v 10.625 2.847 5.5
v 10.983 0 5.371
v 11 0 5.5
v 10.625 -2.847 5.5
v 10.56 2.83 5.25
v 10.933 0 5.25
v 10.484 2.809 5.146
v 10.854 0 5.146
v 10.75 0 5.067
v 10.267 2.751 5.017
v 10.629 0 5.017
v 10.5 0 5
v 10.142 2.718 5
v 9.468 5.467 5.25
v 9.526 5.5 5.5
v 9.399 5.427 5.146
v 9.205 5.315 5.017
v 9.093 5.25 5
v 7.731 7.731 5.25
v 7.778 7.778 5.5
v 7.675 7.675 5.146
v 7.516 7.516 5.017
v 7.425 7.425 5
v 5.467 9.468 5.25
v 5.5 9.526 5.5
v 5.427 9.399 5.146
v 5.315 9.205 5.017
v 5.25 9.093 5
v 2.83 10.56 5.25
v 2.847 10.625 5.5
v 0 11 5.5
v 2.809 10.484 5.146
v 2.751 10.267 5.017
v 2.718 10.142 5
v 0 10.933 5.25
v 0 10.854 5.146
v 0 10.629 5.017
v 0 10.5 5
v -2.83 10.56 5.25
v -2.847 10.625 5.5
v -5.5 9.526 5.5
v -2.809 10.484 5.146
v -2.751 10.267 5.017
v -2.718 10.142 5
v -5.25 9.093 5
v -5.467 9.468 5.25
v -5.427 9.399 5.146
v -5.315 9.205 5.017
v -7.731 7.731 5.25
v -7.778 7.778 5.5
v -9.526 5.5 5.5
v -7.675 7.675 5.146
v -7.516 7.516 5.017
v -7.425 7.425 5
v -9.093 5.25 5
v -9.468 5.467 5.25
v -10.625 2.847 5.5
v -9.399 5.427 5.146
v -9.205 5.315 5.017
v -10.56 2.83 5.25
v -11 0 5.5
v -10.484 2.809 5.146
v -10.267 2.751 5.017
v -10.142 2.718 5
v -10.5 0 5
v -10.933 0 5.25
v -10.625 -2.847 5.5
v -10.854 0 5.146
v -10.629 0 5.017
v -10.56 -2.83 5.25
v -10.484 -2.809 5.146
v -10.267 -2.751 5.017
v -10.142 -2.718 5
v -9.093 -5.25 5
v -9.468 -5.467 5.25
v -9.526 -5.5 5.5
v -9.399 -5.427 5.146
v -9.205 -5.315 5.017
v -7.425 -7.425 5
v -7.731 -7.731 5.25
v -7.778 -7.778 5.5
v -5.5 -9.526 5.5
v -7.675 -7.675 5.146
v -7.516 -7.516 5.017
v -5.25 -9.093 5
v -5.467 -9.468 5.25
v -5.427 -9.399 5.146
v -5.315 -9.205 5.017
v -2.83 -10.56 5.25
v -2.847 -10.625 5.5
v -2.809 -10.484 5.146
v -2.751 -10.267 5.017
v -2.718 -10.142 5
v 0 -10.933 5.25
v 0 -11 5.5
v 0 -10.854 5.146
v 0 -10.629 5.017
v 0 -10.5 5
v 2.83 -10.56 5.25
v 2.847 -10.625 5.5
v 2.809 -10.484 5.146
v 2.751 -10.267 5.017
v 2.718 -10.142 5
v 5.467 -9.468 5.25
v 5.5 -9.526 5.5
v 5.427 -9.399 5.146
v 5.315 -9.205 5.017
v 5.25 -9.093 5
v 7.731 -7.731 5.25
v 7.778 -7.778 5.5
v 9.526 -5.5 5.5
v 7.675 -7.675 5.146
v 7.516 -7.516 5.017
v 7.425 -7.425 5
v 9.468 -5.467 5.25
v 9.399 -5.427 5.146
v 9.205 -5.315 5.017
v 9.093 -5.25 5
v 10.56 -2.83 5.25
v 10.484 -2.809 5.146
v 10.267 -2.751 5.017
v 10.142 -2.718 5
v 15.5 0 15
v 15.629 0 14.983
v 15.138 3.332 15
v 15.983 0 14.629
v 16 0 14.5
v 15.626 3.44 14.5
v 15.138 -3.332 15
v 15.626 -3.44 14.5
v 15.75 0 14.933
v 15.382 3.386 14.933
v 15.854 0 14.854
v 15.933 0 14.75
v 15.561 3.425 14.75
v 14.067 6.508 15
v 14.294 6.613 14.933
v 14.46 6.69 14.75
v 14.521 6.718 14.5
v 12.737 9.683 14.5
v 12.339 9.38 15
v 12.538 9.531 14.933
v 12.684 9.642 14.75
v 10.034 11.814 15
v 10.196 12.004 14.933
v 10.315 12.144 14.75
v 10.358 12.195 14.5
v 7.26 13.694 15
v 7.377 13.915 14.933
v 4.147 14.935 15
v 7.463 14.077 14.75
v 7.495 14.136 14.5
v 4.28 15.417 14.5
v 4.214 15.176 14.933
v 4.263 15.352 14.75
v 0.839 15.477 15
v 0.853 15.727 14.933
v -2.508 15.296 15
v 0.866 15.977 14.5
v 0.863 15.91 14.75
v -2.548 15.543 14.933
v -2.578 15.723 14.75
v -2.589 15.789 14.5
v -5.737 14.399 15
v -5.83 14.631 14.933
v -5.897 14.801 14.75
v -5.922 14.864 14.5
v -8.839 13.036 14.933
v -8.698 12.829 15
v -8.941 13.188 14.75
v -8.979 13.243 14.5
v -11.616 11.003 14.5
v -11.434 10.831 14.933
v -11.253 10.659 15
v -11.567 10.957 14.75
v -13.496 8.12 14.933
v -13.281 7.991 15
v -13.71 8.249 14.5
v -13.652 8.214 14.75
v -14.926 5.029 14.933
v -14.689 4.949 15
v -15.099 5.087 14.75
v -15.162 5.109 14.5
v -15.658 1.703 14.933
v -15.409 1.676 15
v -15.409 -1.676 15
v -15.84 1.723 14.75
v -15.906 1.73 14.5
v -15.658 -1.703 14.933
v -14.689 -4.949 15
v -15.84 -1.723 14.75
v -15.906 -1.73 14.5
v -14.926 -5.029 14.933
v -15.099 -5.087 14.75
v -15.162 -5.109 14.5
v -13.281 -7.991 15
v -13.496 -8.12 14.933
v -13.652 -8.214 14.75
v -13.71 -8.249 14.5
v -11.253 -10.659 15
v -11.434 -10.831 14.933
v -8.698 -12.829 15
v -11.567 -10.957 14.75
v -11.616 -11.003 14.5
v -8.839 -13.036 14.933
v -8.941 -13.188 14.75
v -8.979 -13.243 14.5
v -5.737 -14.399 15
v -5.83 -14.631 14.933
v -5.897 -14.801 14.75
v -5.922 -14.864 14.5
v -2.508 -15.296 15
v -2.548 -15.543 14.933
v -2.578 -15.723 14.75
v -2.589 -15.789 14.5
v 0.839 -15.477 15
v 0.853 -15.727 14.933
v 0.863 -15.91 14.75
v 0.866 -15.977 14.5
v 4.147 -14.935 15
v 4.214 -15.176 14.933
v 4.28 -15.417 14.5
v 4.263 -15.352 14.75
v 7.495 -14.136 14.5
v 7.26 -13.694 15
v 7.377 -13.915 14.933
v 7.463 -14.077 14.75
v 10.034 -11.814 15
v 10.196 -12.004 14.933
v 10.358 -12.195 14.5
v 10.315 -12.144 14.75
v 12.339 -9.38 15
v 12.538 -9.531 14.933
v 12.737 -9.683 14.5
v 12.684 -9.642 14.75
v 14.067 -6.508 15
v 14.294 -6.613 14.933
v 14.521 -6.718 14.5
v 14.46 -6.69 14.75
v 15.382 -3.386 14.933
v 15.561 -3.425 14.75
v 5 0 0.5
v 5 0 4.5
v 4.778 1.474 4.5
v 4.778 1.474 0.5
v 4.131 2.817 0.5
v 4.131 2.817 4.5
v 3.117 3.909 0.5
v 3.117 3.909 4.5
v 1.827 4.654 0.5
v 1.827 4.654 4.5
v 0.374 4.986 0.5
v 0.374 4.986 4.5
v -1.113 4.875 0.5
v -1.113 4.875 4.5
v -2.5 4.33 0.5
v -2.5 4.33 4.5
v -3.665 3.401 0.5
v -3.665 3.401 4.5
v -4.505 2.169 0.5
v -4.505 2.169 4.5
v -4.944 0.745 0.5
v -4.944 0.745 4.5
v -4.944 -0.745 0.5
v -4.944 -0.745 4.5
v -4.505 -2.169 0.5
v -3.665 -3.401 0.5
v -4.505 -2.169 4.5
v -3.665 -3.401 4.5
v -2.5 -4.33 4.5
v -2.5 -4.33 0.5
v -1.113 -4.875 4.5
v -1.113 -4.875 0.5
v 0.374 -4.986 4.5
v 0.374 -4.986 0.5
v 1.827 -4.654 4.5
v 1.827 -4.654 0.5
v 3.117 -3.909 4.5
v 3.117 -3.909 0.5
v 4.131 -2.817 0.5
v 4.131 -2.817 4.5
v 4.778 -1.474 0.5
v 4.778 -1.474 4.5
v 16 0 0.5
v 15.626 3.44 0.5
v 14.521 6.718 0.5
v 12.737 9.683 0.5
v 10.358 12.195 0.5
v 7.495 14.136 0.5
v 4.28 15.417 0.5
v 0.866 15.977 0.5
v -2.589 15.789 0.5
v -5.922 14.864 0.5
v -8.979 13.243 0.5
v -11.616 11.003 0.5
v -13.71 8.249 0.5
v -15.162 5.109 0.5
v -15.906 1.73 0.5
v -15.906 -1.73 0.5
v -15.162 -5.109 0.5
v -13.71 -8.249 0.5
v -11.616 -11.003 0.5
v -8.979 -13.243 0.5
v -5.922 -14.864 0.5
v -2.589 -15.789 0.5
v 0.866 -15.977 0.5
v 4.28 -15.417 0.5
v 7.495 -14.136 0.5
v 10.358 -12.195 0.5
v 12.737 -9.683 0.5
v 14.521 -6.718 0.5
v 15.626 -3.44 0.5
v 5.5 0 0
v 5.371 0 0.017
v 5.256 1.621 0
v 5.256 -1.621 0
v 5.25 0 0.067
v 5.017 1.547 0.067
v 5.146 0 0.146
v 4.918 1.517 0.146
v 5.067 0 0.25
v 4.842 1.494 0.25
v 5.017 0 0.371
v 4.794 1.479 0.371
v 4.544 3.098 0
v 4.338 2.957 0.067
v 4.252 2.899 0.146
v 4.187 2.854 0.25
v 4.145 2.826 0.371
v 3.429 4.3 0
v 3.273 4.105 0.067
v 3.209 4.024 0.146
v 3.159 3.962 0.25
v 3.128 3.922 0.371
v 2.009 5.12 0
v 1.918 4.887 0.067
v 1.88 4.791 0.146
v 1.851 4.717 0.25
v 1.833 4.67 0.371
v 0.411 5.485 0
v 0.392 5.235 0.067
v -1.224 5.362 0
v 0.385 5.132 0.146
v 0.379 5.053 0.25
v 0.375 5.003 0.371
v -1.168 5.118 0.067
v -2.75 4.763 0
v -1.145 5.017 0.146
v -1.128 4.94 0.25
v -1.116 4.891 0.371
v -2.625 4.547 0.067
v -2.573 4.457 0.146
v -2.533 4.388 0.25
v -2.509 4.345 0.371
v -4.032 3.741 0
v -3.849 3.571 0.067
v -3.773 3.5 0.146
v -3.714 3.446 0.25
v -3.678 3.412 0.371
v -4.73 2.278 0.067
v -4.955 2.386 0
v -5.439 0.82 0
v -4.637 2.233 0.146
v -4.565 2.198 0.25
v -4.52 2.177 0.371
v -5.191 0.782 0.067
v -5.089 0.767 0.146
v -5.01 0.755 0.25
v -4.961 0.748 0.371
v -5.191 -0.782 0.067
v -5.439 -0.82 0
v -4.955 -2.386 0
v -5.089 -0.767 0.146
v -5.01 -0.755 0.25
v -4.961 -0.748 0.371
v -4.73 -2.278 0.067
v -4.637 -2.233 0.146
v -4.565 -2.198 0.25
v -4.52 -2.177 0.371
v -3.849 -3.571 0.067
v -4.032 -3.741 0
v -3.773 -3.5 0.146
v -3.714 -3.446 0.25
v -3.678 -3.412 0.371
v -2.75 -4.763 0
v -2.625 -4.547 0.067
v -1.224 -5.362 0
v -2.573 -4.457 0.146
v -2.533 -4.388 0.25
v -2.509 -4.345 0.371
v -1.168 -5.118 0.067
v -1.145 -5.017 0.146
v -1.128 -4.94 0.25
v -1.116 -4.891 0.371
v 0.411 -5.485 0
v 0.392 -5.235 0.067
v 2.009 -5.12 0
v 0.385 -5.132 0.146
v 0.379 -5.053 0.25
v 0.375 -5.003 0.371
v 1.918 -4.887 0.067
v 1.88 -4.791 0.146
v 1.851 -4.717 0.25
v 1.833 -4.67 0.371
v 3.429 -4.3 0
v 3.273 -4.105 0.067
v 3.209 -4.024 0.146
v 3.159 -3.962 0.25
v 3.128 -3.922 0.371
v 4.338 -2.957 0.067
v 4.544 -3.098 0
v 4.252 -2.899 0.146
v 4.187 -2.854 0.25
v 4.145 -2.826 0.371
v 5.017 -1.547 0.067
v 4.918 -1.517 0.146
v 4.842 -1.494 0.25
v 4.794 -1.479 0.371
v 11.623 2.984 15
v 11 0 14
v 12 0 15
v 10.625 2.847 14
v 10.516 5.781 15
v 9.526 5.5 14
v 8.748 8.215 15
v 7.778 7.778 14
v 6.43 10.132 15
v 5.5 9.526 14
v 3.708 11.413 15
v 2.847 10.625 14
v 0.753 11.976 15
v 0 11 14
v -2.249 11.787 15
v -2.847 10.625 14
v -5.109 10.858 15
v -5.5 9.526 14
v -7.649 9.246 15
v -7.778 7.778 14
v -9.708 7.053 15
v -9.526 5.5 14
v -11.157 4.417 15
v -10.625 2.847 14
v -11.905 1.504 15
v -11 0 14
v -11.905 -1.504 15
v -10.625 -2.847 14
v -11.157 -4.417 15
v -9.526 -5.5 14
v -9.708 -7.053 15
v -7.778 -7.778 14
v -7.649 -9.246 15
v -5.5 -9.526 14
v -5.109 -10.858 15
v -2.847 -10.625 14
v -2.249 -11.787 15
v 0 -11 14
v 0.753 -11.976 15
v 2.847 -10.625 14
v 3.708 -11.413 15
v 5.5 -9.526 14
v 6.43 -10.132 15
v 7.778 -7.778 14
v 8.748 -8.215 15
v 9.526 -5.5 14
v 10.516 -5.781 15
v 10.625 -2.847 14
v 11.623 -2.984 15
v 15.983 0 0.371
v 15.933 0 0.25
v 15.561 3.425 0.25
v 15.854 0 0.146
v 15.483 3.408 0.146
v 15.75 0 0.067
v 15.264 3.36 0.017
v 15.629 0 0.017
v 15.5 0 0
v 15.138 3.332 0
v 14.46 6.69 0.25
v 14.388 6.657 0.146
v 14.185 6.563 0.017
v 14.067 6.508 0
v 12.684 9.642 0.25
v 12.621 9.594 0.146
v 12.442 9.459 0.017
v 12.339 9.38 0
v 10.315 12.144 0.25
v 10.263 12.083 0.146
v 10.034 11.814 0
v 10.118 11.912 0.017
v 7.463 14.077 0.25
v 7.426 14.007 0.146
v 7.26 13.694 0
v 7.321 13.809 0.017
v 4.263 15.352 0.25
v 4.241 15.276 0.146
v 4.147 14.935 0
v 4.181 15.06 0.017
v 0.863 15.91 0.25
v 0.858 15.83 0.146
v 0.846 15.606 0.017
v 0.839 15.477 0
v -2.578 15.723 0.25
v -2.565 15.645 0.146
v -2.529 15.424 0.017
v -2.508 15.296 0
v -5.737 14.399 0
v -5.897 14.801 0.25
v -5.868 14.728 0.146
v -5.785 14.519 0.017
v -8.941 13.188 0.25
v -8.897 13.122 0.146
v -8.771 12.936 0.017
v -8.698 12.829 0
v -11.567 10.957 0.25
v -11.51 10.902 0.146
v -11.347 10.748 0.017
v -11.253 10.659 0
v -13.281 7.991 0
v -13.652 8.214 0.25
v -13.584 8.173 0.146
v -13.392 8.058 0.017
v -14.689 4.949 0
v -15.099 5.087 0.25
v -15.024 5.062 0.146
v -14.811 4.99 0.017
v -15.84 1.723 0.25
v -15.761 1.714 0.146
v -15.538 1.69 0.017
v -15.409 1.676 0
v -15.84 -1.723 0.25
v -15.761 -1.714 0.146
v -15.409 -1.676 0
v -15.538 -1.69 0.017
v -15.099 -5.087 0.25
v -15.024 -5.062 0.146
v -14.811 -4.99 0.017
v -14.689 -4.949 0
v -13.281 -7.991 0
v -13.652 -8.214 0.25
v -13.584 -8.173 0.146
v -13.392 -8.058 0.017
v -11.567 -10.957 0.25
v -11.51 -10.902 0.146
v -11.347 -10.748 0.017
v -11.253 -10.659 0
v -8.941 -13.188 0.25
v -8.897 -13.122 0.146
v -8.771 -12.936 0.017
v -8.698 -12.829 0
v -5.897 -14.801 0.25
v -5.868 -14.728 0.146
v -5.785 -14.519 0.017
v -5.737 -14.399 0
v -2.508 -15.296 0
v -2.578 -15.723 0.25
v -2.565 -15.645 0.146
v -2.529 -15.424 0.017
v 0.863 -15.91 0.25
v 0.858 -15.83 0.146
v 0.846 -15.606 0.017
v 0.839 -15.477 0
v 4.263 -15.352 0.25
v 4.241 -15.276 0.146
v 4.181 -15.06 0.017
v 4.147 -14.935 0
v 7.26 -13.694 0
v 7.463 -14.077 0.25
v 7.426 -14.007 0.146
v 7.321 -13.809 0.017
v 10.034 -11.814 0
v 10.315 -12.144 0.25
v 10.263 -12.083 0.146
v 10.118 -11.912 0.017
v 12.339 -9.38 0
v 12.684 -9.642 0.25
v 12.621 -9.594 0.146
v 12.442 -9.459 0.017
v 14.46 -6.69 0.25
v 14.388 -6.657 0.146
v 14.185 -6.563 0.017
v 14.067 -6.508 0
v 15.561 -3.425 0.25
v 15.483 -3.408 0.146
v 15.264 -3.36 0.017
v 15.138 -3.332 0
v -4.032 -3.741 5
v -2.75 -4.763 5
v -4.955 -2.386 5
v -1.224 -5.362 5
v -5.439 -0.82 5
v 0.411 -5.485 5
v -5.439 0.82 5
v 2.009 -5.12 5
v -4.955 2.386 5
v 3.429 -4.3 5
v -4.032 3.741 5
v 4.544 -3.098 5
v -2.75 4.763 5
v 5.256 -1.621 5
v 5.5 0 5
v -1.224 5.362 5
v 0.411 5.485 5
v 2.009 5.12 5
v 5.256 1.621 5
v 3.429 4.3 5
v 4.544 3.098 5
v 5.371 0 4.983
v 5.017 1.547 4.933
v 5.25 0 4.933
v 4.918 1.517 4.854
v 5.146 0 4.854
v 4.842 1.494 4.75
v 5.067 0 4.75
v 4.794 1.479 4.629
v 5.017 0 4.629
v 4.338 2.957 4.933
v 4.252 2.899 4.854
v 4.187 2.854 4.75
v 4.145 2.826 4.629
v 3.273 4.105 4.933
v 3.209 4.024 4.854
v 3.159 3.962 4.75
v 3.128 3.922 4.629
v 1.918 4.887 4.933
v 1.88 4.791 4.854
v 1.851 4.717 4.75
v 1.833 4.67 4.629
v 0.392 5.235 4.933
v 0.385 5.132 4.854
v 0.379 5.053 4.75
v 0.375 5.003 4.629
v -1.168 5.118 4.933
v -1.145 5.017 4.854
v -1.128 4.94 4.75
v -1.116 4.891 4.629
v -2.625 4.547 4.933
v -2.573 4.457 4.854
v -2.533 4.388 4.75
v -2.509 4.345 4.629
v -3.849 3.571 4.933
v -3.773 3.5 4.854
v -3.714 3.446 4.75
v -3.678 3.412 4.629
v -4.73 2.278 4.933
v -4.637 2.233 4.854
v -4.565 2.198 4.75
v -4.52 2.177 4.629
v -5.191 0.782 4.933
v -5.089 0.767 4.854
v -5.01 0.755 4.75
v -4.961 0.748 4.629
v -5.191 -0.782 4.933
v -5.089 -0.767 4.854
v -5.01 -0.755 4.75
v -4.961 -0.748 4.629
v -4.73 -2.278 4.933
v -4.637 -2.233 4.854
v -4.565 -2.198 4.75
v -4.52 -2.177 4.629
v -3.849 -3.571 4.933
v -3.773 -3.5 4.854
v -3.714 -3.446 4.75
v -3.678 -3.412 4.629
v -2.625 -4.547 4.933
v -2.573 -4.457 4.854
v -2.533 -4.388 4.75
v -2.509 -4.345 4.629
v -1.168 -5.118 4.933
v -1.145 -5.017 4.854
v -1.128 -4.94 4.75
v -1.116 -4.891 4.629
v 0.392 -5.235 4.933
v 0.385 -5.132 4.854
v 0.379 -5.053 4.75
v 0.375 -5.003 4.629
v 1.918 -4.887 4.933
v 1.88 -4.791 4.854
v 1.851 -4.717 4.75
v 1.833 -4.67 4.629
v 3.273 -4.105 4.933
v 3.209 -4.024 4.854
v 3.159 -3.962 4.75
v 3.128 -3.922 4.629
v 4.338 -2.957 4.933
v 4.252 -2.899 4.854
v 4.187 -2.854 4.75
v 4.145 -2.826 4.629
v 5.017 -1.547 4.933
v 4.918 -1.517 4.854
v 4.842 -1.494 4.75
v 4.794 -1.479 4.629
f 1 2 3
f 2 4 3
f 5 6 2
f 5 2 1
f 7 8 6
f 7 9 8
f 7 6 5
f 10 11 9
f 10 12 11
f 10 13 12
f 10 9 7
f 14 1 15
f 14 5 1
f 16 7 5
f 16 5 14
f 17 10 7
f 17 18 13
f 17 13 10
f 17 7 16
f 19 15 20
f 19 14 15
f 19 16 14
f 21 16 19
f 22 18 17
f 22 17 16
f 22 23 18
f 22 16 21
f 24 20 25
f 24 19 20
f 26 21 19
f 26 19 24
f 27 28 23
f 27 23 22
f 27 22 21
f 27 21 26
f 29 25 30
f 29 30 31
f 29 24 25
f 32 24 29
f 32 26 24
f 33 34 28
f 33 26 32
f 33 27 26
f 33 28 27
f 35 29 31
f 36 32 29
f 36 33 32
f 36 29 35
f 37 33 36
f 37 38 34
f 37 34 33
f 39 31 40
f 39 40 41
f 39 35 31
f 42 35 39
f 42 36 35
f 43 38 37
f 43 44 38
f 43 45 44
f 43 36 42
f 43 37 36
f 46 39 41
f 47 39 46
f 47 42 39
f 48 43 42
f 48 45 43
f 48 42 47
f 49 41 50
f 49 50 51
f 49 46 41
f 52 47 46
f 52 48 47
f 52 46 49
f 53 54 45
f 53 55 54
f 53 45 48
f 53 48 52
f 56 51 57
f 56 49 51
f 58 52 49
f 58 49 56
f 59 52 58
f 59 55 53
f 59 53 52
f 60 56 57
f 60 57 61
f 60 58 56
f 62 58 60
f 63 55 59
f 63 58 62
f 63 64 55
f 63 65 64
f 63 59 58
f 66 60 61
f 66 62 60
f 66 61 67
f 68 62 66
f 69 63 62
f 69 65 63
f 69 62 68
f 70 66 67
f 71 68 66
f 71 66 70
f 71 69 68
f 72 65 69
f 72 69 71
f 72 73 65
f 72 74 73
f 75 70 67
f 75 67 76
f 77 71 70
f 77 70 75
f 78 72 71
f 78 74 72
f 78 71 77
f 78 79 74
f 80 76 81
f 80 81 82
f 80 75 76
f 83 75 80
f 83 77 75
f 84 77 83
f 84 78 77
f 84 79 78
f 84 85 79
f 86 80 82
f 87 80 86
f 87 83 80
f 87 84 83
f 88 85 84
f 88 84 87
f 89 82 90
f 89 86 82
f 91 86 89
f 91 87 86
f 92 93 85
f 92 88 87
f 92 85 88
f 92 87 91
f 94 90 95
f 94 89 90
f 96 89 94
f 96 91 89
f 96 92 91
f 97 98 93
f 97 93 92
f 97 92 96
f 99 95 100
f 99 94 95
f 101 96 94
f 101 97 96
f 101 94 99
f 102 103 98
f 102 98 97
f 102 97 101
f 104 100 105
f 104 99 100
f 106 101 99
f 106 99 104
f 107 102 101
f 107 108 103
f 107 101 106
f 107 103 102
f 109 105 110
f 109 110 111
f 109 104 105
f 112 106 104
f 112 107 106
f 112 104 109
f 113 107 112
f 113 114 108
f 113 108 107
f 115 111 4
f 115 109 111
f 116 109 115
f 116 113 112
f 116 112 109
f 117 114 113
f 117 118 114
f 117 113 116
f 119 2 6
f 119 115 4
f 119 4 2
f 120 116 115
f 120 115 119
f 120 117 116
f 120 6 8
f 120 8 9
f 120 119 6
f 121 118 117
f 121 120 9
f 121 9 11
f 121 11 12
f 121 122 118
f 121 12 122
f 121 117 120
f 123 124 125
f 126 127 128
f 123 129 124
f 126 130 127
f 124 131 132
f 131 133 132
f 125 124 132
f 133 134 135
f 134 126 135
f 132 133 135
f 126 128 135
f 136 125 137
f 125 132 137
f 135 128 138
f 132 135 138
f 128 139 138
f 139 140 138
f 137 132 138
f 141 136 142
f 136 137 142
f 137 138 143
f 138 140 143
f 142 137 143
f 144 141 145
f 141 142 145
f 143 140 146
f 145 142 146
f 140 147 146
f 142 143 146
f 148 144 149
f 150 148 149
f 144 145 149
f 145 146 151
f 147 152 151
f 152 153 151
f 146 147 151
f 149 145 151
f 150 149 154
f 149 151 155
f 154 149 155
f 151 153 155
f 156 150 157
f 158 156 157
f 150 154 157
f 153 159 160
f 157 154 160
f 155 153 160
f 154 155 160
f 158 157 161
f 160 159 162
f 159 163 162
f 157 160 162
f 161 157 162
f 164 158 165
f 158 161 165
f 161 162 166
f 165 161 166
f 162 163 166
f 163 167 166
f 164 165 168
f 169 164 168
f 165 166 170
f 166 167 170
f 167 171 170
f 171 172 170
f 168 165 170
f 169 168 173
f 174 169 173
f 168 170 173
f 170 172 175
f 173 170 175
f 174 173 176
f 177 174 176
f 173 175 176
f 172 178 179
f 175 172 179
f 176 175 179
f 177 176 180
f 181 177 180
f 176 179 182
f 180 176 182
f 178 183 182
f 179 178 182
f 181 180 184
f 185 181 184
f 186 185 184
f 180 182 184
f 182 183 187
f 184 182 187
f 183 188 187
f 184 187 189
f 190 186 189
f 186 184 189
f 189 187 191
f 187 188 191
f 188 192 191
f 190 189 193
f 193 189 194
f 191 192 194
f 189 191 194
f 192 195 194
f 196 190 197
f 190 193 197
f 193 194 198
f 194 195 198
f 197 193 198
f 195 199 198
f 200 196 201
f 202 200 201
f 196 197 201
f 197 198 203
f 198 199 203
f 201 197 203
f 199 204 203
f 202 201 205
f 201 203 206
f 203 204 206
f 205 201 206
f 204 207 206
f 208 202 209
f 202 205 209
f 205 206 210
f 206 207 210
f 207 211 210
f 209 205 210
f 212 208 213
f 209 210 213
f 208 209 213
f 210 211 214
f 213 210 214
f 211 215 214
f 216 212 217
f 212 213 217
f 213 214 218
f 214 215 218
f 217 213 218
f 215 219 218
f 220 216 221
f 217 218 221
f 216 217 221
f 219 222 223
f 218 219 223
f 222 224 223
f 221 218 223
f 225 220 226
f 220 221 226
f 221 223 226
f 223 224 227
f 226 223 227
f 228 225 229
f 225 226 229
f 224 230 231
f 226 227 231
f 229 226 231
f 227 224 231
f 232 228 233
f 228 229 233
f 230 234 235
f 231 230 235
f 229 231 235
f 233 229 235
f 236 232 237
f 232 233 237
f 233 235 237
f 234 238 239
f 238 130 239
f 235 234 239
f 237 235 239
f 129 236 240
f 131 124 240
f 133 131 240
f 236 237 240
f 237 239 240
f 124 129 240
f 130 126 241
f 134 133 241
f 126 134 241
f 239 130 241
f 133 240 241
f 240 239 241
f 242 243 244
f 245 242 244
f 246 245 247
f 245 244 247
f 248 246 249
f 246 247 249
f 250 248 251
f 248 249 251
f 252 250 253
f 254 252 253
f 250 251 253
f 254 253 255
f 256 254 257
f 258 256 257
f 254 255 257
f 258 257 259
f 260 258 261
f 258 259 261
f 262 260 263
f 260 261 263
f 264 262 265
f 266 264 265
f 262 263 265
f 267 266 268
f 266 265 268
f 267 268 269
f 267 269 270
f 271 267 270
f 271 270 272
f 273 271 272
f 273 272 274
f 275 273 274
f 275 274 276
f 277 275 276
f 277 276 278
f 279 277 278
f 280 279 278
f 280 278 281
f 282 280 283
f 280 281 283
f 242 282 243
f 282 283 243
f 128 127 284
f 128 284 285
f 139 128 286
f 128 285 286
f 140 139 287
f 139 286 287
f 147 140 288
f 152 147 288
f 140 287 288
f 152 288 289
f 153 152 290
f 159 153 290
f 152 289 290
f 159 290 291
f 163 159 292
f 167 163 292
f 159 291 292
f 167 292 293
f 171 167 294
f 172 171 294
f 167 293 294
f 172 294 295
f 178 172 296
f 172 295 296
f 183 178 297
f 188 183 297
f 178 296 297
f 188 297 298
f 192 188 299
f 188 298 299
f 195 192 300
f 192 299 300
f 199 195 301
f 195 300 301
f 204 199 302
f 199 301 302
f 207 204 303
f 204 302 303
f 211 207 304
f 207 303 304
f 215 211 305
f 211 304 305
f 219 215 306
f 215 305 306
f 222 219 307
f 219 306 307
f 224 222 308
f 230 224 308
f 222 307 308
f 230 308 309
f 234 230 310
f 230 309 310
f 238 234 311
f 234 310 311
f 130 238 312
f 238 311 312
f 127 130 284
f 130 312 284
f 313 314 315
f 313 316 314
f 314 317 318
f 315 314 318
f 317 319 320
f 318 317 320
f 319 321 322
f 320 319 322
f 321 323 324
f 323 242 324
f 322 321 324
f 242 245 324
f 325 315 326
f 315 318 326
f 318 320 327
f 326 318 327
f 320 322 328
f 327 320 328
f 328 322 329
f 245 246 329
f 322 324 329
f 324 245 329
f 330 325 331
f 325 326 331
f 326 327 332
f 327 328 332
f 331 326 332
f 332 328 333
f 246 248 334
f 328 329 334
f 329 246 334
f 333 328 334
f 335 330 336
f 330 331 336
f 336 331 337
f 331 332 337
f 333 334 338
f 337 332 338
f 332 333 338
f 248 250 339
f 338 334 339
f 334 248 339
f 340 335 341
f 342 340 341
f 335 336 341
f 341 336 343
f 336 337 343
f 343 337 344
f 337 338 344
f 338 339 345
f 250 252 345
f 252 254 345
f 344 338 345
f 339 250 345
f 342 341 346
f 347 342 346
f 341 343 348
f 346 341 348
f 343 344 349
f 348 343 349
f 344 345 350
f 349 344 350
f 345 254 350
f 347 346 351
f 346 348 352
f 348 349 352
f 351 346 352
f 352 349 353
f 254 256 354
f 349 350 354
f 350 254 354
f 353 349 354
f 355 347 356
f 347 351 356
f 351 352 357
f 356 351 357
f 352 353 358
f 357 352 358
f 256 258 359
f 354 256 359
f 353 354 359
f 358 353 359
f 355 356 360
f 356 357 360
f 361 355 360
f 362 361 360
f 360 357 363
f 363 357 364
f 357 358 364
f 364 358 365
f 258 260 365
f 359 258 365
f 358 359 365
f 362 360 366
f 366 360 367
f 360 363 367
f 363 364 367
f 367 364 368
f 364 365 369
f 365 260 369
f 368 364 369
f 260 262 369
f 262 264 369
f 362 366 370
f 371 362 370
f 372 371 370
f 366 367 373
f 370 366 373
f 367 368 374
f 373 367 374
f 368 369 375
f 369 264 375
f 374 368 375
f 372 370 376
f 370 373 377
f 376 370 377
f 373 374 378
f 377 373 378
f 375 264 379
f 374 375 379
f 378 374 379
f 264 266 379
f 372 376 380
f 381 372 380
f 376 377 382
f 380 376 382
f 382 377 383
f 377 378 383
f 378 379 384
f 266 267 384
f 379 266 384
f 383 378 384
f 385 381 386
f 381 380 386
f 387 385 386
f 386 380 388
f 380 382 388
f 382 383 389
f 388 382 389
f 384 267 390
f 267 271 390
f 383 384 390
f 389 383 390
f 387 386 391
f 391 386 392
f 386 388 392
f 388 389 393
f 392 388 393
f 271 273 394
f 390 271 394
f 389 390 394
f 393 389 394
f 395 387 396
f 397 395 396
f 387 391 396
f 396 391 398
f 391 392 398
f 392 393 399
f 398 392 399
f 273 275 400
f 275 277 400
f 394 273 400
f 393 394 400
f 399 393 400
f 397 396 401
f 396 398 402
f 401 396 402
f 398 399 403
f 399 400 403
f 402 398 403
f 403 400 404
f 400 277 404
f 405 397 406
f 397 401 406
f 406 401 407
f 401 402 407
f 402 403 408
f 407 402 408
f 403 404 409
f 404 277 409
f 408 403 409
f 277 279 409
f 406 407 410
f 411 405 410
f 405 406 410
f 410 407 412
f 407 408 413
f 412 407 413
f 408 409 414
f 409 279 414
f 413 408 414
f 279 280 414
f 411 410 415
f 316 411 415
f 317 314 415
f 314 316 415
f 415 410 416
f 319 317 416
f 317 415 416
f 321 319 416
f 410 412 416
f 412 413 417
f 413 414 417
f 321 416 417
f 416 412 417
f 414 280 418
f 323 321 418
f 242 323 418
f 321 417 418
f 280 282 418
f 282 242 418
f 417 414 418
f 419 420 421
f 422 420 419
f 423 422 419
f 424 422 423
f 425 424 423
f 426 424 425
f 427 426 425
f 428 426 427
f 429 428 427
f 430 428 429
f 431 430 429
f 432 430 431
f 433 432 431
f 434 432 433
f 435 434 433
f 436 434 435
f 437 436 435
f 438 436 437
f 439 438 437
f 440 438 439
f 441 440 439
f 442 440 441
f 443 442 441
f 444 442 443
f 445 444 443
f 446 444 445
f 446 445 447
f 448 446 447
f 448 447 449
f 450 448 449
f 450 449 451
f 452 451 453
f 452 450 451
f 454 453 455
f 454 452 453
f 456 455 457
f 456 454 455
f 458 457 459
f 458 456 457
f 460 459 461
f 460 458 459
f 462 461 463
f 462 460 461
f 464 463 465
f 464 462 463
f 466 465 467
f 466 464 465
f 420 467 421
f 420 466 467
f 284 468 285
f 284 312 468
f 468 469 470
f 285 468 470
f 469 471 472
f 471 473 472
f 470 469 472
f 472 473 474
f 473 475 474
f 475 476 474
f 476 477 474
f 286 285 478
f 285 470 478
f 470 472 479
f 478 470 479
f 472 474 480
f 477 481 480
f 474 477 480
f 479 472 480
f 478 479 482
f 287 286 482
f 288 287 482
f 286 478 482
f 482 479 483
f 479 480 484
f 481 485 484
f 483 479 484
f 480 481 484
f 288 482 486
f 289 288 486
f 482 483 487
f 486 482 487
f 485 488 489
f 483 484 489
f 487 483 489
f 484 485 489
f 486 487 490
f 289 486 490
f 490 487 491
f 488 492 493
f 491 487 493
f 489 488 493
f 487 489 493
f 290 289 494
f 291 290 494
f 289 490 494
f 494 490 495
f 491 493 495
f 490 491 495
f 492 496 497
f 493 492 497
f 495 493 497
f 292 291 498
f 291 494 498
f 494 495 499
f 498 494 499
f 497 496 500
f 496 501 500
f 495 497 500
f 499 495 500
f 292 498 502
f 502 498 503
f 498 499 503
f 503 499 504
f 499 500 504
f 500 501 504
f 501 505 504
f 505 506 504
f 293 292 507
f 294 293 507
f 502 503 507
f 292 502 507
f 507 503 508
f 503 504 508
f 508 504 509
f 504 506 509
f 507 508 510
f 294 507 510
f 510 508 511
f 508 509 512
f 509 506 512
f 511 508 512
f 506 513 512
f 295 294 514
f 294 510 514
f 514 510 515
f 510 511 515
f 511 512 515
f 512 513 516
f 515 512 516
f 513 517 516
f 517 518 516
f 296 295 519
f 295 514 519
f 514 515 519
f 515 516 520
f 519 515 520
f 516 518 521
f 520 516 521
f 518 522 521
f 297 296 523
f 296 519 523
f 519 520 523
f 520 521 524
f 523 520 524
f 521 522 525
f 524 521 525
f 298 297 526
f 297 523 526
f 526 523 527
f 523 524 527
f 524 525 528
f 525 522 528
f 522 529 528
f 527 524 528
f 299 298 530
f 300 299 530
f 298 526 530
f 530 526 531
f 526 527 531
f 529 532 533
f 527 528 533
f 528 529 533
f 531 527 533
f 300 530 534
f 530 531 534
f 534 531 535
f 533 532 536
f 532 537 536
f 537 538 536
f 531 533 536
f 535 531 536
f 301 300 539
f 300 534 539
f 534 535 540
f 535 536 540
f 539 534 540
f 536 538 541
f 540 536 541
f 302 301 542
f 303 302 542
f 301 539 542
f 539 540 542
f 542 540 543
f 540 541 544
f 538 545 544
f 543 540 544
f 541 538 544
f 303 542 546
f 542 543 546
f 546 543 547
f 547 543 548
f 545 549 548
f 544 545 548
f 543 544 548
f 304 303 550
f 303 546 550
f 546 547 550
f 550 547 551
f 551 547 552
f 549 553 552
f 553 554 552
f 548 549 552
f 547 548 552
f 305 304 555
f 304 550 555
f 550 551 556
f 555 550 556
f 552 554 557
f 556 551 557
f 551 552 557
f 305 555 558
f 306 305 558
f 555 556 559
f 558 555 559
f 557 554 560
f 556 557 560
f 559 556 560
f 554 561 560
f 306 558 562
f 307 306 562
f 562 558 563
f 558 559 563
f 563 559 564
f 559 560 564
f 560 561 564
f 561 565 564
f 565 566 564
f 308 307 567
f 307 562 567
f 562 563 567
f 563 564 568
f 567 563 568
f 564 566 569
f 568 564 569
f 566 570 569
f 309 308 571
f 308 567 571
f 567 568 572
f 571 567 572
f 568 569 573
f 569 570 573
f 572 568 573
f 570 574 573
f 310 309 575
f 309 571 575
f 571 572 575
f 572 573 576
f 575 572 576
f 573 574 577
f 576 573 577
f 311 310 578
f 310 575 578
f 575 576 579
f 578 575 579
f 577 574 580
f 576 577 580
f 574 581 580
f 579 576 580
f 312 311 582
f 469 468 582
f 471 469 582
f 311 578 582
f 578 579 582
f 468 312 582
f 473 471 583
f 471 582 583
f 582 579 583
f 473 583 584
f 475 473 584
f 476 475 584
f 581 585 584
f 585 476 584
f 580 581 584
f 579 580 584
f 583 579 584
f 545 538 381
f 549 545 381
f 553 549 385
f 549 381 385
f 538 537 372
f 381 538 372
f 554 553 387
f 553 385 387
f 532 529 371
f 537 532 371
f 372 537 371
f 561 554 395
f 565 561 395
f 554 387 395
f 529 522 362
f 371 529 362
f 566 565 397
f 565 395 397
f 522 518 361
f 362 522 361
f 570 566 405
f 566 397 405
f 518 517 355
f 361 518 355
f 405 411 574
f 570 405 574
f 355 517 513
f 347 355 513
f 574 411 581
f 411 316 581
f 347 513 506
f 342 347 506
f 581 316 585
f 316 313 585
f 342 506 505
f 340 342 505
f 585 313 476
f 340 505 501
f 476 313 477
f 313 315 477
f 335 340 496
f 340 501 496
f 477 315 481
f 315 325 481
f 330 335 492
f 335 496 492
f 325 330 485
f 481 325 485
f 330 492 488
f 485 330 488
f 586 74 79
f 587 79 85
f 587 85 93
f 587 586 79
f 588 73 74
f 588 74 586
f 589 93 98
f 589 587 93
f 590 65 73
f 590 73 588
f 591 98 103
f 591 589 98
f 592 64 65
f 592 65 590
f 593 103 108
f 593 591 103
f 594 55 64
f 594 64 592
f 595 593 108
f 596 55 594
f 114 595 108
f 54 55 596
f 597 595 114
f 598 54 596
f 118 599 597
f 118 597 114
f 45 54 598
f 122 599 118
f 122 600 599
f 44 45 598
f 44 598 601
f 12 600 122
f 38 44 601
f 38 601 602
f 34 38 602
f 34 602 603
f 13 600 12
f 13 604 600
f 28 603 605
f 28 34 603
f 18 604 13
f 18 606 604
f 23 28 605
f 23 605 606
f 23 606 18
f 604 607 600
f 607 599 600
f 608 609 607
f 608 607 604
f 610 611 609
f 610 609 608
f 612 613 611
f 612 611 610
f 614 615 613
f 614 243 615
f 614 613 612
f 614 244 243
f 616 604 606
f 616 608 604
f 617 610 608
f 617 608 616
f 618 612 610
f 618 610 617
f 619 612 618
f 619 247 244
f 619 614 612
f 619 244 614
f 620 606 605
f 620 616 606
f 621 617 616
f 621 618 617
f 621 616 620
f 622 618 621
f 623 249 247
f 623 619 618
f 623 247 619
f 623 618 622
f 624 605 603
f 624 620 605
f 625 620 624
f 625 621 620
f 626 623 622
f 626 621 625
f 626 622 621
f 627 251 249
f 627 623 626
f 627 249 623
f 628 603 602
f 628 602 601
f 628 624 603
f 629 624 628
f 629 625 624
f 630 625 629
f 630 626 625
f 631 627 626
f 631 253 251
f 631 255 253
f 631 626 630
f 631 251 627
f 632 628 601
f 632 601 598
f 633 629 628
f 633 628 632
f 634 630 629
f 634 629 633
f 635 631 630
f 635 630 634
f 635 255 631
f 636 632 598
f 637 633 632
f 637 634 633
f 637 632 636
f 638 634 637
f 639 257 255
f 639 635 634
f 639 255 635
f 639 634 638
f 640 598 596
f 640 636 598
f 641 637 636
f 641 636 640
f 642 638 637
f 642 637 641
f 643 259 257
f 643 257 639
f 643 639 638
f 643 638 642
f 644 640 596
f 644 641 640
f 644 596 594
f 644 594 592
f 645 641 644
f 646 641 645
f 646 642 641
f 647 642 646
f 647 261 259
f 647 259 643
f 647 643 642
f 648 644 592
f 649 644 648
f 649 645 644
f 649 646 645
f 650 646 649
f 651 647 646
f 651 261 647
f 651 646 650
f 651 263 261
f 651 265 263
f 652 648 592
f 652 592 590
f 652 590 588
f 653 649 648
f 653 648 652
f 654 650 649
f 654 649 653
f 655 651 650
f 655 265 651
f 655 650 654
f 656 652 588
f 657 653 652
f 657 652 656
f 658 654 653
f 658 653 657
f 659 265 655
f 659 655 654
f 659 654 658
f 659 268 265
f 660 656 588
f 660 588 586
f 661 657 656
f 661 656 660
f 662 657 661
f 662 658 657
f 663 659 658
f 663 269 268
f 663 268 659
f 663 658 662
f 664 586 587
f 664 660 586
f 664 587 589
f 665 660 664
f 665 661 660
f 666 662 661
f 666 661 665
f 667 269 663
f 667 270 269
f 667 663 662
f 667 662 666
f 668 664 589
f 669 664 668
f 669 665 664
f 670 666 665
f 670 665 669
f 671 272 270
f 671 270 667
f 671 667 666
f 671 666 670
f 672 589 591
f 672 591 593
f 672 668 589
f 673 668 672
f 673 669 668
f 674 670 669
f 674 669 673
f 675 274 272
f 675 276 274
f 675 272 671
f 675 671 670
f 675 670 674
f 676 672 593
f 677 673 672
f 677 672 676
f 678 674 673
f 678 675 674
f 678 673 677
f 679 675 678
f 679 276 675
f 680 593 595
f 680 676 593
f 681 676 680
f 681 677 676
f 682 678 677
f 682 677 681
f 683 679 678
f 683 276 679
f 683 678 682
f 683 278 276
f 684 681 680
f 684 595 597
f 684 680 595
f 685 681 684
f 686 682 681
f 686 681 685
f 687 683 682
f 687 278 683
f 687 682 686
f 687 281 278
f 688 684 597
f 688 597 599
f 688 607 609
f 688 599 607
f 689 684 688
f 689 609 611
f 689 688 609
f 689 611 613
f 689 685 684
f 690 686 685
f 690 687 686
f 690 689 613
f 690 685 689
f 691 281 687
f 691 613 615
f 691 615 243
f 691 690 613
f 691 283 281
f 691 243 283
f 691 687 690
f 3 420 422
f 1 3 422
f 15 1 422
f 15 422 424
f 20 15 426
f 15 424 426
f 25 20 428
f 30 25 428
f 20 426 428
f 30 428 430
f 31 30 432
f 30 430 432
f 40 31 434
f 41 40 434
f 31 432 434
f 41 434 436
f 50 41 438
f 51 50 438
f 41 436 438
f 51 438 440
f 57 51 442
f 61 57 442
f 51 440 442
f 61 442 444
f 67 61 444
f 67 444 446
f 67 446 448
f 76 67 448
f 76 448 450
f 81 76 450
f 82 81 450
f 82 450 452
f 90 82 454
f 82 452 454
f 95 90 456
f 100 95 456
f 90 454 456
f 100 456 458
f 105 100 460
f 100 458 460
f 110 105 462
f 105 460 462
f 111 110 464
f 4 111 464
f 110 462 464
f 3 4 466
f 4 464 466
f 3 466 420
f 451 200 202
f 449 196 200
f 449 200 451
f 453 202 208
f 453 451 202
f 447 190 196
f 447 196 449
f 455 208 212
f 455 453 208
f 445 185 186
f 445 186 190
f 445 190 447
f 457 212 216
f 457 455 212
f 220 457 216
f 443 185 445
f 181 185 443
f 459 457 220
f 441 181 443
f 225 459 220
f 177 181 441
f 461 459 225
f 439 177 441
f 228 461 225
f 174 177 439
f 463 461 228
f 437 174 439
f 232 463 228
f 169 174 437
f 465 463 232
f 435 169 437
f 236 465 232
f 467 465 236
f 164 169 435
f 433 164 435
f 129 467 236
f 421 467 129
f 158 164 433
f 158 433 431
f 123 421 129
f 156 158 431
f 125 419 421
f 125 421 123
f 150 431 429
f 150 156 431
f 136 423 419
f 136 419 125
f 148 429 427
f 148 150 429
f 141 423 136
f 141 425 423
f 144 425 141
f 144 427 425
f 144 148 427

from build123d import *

# Parameters (mm, degrees)
CROQUIS1_R              = 16
SALIENTE_EXTRUIR1_DEPTH = 15
CROQUIS2_R              = 11
CORTAR_EXTRUIR1_DEPTH   = 10
CROQUIS3_R              = 5
CORTAR_EXTRUIR2_DEPTH   = 5
CHAFL_N1_SIZE           = 1
REDONDEO1_R             = 0.5


with BuildPart() as part:
    # Croquis1 → Saliente-Extruir1 (new body)
    with BuildSketch(Plane.XY):
        Circle(CROQUIS1_R)
    extrude(amount=SALIENTE_EXTRUIR1_DEPTH)

    # Croquis2 → Cortar-Extruir1 (cut)
    with BuildSketch(Plane.XY.offset(15)):
        Circle(CROQUIS2_R)
    extrude(amount=-CORTAR_EXTRUIR1_DEPTH, mode=Mode.SUBTRACT)

    # Croquis3 → Cortar-Extruir2 (cut)
    with BuildSketch(Plane.XY.offset(5)):
        Circle(CROQUIS3_R)
    extrude(amount=-CORTAR_EXTRUIR2_DEPTH, mode=Mode.SUBTRACT)

    # Chaflán1
    chafl_n1_edges = [part.edges().sort_by_distance(p)[0] for p in [
        (-11, 0, 15),
    ]]
    chamfer(chafl_n1_edges, length=CHAFL_N1_SIZE)

    # Redondeo1
    redondeo1_edges = [part.edges().sort_by_distance(p)[0] for p in [
        (-5, 0, 5),
        (-5, 0, 0),
        (-16, 0, 0),
        (-16, 0, 15),
        (-11, 0, 5),
    ]]
    fillet(redondeo1_edges, radius=REDONDEO1_R)


solid = part.part
